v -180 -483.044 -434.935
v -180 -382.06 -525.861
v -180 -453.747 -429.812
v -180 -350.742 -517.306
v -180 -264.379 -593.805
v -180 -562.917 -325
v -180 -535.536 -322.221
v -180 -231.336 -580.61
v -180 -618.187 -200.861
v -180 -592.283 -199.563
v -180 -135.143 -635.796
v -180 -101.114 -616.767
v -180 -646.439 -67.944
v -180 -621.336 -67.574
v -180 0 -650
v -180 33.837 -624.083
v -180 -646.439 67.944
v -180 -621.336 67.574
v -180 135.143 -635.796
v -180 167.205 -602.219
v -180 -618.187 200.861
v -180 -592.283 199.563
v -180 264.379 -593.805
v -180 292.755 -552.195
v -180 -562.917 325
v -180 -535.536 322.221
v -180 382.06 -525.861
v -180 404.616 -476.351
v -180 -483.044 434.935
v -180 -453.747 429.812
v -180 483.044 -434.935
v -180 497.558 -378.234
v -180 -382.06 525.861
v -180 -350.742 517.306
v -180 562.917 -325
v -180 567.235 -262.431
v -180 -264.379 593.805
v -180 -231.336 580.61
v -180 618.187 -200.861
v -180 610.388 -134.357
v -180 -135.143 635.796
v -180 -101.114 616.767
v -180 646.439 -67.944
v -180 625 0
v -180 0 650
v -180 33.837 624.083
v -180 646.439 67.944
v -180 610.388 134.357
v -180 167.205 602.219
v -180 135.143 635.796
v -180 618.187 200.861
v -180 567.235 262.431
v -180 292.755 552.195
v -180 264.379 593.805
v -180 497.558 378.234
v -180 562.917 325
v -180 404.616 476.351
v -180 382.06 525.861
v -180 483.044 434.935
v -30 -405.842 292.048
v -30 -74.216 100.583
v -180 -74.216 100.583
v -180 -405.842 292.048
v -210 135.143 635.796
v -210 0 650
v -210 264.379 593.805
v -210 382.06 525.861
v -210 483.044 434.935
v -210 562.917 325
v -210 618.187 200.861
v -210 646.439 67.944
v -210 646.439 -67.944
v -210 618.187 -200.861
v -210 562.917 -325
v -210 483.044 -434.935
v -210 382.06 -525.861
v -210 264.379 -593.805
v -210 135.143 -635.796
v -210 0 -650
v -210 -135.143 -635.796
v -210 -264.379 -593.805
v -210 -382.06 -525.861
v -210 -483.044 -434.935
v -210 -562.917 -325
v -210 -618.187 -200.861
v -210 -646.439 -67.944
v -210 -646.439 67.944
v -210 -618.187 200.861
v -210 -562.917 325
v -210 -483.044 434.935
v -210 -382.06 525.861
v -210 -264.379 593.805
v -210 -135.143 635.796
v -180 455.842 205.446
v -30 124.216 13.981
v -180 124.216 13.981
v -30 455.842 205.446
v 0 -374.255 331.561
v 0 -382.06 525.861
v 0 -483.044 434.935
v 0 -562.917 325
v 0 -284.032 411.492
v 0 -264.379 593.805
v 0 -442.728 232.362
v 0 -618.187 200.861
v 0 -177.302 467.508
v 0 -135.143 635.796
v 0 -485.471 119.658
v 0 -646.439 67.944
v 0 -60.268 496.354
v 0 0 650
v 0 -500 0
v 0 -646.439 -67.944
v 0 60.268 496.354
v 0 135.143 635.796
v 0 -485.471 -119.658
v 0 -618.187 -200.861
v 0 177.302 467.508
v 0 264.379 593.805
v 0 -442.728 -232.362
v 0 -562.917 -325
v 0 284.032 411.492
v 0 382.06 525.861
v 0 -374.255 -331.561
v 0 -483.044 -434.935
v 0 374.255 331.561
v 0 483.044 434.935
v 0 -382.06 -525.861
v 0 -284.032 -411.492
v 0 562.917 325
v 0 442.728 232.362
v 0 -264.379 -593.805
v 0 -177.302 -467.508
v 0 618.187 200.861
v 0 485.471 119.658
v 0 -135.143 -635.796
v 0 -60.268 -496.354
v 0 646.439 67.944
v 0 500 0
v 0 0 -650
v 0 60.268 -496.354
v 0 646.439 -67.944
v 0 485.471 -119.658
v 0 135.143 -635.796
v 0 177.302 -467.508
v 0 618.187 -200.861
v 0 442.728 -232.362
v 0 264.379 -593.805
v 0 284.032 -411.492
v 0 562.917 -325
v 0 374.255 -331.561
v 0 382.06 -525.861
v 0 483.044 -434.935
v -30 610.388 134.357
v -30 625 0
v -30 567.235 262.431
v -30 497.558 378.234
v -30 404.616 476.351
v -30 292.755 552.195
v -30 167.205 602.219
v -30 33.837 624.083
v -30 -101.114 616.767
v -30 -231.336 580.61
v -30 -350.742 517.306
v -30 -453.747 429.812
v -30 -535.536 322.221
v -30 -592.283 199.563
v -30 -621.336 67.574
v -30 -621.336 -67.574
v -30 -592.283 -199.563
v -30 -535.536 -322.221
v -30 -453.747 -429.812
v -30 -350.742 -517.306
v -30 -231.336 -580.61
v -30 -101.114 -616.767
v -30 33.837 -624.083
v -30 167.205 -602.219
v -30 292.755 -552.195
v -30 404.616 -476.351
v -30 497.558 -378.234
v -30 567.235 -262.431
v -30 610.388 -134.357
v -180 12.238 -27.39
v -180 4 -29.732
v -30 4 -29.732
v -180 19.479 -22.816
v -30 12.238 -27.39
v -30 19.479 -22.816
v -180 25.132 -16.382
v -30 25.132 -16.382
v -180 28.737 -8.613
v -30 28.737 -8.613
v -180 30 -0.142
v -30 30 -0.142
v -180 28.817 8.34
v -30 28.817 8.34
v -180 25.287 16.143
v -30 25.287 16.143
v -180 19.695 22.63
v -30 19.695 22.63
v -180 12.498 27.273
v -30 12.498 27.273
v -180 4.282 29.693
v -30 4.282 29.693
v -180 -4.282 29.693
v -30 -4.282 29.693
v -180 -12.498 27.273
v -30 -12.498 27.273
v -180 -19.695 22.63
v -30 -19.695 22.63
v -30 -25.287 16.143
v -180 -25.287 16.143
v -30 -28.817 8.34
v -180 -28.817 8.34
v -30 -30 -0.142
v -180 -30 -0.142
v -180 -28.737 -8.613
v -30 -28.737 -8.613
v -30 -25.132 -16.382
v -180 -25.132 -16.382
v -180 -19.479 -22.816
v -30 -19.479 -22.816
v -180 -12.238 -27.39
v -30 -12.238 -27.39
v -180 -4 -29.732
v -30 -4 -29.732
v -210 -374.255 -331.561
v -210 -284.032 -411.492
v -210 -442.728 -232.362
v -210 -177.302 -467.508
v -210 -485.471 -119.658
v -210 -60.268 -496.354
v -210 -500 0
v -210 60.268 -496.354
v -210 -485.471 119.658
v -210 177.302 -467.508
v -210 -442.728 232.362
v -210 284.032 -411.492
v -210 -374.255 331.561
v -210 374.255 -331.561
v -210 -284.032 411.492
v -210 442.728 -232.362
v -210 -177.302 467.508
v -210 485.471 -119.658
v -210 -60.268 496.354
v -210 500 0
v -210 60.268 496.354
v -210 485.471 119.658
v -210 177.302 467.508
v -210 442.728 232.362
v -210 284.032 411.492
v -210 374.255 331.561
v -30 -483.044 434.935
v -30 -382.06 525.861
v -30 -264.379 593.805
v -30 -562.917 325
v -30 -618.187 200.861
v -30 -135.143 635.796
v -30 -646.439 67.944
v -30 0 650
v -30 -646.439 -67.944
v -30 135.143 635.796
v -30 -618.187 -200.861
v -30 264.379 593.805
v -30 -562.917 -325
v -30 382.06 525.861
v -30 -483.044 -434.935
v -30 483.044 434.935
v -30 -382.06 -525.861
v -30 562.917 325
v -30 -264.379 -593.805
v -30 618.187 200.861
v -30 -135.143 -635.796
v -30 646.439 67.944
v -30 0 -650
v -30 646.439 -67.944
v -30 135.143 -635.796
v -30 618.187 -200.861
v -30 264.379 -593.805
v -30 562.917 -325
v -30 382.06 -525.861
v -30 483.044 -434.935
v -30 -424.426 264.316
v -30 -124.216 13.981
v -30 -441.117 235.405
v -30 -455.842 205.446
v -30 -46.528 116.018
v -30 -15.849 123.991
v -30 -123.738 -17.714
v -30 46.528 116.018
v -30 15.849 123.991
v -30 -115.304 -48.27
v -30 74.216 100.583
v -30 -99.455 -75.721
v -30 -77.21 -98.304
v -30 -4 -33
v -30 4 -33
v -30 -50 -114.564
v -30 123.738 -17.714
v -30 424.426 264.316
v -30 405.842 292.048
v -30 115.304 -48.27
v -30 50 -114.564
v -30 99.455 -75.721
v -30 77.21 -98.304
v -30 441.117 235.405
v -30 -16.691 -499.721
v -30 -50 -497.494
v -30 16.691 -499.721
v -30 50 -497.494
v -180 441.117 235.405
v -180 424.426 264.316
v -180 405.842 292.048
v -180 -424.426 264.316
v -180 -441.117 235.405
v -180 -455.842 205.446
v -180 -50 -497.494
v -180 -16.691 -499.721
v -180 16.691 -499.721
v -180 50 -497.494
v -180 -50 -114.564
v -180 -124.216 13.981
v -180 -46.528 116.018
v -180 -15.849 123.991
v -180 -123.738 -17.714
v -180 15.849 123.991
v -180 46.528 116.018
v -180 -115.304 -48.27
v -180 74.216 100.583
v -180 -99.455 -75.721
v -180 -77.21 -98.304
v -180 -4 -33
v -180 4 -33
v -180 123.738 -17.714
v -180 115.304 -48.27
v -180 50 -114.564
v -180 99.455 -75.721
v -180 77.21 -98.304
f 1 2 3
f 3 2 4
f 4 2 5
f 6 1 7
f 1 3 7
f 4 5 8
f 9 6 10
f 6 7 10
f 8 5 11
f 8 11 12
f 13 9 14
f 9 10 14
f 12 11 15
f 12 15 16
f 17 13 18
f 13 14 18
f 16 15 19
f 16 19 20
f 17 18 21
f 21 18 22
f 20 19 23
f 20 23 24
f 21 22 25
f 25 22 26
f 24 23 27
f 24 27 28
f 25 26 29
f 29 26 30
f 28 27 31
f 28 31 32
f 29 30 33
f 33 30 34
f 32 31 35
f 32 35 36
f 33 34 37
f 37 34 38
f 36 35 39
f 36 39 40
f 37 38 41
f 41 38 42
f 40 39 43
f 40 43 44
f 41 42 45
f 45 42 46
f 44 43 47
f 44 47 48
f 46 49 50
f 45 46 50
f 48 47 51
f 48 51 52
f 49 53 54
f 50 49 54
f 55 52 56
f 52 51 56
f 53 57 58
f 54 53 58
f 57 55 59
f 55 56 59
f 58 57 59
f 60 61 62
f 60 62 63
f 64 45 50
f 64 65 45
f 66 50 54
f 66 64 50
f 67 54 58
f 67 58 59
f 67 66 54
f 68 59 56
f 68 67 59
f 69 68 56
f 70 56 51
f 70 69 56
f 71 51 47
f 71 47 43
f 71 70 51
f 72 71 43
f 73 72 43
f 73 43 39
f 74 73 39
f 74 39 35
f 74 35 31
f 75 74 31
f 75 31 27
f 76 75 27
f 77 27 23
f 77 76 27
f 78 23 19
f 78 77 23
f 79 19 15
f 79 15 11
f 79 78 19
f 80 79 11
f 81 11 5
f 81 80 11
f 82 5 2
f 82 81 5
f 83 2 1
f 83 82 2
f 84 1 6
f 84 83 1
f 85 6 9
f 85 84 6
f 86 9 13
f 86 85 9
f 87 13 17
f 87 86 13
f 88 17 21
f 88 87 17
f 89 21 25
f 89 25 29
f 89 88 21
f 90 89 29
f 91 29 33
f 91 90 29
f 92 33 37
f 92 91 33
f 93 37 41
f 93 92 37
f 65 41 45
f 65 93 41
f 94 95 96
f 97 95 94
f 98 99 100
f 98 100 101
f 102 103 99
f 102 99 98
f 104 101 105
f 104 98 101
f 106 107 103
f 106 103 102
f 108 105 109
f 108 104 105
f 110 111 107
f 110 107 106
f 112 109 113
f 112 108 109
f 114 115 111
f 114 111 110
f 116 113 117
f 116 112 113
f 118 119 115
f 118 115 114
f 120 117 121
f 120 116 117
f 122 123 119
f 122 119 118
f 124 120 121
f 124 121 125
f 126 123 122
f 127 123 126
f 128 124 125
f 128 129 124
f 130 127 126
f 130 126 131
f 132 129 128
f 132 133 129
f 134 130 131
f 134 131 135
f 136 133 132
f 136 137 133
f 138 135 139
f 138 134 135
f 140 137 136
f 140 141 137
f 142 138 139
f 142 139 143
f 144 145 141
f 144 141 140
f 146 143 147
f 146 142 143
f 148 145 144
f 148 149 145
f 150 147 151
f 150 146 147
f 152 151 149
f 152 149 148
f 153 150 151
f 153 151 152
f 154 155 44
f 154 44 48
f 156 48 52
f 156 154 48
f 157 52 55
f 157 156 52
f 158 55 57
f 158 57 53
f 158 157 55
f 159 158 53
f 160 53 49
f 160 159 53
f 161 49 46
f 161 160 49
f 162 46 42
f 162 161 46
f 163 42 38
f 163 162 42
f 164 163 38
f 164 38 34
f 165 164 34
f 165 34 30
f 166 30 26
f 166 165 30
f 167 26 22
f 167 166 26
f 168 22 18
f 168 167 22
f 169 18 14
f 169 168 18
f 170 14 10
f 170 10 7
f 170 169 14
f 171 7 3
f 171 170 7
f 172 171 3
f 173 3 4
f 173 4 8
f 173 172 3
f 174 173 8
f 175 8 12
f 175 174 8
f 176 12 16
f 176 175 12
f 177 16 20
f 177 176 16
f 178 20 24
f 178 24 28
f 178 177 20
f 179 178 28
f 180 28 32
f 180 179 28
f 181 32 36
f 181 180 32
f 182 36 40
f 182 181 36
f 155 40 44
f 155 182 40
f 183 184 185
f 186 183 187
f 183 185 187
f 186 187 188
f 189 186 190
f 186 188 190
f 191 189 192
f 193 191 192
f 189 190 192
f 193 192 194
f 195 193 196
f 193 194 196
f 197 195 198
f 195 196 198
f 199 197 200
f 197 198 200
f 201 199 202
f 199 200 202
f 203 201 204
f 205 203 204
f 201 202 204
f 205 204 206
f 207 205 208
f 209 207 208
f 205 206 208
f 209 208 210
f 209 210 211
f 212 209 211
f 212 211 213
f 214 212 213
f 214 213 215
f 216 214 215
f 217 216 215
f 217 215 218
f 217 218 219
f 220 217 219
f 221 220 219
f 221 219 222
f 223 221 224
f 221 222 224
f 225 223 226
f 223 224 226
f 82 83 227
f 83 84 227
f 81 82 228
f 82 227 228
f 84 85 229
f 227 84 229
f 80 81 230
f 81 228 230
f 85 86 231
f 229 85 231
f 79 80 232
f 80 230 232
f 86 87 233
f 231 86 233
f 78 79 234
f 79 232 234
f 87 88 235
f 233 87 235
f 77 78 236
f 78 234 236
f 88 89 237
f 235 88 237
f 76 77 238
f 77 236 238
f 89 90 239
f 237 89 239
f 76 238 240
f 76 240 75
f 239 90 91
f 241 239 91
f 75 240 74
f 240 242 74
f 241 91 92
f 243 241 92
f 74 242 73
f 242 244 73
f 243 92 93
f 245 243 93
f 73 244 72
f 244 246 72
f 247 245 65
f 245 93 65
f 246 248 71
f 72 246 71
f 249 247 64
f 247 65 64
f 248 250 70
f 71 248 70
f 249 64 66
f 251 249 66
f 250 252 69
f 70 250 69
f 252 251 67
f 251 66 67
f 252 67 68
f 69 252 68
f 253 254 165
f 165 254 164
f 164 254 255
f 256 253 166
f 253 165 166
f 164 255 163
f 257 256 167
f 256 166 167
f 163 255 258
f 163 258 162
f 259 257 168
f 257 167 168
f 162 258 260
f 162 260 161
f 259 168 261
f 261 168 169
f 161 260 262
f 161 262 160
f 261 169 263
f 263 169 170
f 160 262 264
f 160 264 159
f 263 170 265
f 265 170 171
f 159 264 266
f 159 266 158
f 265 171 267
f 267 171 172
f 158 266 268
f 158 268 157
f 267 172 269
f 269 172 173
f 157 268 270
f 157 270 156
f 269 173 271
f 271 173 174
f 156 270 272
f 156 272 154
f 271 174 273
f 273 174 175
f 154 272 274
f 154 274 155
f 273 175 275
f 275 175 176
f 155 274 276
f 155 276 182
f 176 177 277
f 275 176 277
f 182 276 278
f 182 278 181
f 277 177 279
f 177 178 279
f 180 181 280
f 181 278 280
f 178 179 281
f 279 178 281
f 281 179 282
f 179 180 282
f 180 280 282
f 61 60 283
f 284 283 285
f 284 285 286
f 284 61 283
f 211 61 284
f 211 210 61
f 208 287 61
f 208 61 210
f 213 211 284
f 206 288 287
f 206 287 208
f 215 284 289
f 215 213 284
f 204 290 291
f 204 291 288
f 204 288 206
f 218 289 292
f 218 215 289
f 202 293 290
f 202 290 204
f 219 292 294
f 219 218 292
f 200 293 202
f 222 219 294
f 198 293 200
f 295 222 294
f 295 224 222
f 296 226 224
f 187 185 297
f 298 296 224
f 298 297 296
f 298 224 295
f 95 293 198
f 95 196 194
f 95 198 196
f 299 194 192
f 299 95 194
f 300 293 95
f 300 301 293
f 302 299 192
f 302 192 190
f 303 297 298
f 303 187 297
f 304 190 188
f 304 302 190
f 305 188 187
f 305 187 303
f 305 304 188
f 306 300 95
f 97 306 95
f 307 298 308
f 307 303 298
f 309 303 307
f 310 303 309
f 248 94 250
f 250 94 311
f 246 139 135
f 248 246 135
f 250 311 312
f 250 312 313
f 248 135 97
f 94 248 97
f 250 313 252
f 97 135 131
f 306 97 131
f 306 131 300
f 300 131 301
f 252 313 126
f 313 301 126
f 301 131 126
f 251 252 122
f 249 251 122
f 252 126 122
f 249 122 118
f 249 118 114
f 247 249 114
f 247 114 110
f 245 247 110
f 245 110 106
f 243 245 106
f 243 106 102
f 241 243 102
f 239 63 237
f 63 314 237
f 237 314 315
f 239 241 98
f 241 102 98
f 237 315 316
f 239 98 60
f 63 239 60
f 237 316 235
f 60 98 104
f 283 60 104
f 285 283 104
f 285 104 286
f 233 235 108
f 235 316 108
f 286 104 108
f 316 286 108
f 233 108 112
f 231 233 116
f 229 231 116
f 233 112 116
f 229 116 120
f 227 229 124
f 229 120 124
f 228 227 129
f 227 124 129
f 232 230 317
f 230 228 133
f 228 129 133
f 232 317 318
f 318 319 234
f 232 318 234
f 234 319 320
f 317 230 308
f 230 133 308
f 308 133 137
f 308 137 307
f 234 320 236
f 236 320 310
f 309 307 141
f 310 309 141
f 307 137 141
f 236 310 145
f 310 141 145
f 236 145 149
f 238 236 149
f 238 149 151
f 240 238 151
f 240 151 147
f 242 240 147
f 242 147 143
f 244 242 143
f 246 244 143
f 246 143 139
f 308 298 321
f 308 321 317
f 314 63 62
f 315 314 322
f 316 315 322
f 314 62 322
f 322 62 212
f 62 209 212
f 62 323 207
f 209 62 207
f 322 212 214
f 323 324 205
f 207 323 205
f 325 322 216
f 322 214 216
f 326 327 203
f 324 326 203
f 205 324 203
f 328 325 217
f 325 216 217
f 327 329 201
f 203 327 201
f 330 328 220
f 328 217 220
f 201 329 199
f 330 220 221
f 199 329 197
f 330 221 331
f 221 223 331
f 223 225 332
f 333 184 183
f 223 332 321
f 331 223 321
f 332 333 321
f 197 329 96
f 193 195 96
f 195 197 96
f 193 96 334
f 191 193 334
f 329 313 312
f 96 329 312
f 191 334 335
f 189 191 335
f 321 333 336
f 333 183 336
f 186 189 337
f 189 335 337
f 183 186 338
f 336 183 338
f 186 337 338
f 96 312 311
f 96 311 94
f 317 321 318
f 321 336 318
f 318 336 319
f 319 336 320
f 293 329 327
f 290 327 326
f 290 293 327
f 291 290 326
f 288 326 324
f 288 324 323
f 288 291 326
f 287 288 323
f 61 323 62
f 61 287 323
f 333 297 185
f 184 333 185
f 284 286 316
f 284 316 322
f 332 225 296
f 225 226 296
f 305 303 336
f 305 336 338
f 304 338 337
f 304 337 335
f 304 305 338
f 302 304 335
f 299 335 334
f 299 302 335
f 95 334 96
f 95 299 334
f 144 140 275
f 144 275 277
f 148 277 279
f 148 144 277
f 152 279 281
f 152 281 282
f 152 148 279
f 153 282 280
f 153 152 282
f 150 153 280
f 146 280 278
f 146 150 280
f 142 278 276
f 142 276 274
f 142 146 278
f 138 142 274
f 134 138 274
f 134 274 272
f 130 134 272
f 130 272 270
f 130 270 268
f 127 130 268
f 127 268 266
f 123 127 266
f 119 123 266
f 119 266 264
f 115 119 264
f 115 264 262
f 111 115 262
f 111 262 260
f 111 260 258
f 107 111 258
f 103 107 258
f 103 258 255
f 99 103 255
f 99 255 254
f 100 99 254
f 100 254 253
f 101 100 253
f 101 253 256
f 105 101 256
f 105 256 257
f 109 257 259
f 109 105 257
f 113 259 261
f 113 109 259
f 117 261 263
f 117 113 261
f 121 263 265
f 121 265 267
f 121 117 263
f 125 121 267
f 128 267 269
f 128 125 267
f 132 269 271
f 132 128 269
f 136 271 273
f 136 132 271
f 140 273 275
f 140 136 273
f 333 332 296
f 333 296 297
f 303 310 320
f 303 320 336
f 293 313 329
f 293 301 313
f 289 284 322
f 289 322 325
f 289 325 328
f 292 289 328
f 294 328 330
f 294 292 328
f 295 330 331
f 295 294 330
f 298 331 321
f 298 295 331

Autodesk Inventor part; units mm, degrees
ref_plane "YZ Plane" through (0, 0, 0) normal (1, 0, 0) x (0, 1, 0)
ref_plane "XZ Plane" through (0, 0, 0) normal (0, 1, 0) x (-1, 0, 0)
sketch "Sketch1" plane through (0, 0, 0) normal (1, 0, 0) x (0, 1, 0)
  circle A0 centre (0, 0) radius 500
  circle A1 centre (0, 0) radius 625
  dimension "d0" = 1000
  dimension "d1" = 1250
extrude "Extrusion1" add sketch "Sketch1" against normal blind 210
sketch "Sketch2" plane through (0, 0, 0) normal (1, 0, 0) x (0, 0, -1)
  circle A0 centre (0, 0) radius 650
  circle A1 centre (0, 0) radius 625 projected
  dimension "d4" = 1300
sketch "Sketch3" plane through (-210, 0, 0) normal (-1, 0, 0) x (0, 0, 1)
  circle A0 centre (0, 0) radius 650
  circle A1 centre (0, 0) radius 625 projected
  dimension "d5" = 1300
extrude "Extrusion2" add sketch "Sketch3" against normal blind 30
extrude "Extrusion3" add sketch "Sketch2" against normal blind 30
ref_plane "Work Plane1" through (-30, 0, 0) normal (1, 0, 0) x (0, 0, -1)
sketch "Sketch4" plane through (-30, 0, 0) normal (1, 0, 0) x (0, 0, -1)
  circle A0 centre (0, 0) radius 125
  dimension "d11" = 250
extrude "Extrusion4" add sketch "Sketch4" against normal blind 150
sketch "Sketch5" plane through (-30, 0, 0) normal (1, 0, 0) x (0, 0, -1)
  line L0 (0, 0) -> (469.0204, 0) construction
  line L1 (0, 0) -> (-234.5102, 406.1836) construction
  line L2 (0, 0) -> (-234.5102, -406.1836) construction
  line L3 (0, -910) -> (0, 910) projected
  line L4 (520.2054, 50) -> (0, 50)
  line L5 (0, 50) -> (0, -50)
  line L6 (0, -50) -> (520.2054, -50)
  line L7 (520.2054, -50) -> (520.2054, 50)
  line L8 (-216.8015, 475.5111) -> (-303.404, 425.5111)
  line L9 (43.3013, 25) -> (-216.8015, 475.5111)
  line L10 (-303.404, 425.5111) -> (-43.3013, -25)
  line L11 (-43.3013, -25) -> (43.3013, 25)
  line L12 (-303.404, -425.5111) -> (-216.8015, -475.5111)
  line L13 (-43.3013, 25) -> (-303.404, -425.5111)
  line L14 (-216.8015, -475.5111) -> (43.3013, -25)
  line L15 (43.3013, -25) -> (-43.3013, 25)
  point P0 (234.5102, 0)
  point P1 (0, 0)
  point P2 (0, 0)
  point P3 (0, 0)
  point P4 (28.8675, 50)
  point P5 (-57.735, 0)
  point P6 (28.8675, -50)
  dimension "d16" = 360
  dimension "d18" = 90
  dimension "d19" = 100
  dimension "d20" = 50
  dimension "d21" = 0
  dimension "d24" = 360
extrude "Extrusion5" add sketch "Sketch5" against normal blind 150
sketch "Sketch6" plane through (-30, 0, 0) normal (1, 0, 0) x (0, 0, -1)
  circle A0 centre (0, 0) radius 30
  dimension "d28" = 60
extrude "Extrusion6" cut sketch "Sketch6" against normal through all
sketch "Sketch7" plane through (-30, 0, 0) normal (1, 0, 0) x (0, 0, -1)
  line L0 (33, 4) -> (28, 4)
  line L1 (28, 4) -> (28, -4)
  line L2 (28, -4) -> (33, -4)
  line L3 (33, -4) -> (33, 4)
  line L4 (910, 0) -> (-910, 0) projected
  circle A0 centre (0, 0) radius 30 projected
  point P0 (33, 0)
  dimension "d31" = 8
  dimension "d32" = 5
  dimension "d33" = 4
  dimension "d34" = 33
extrude "Extrusion7" cut sketch "Sketch7" against normal through all contours L3 L4 A0 L0 | A0 L4 L1 L0 | L3 L2 A0 L4 | A0 L2 L1 L4 picked at (28.627, 2.2237) picked at (28.627, -2.2237)
properties part number "Wheel1"
